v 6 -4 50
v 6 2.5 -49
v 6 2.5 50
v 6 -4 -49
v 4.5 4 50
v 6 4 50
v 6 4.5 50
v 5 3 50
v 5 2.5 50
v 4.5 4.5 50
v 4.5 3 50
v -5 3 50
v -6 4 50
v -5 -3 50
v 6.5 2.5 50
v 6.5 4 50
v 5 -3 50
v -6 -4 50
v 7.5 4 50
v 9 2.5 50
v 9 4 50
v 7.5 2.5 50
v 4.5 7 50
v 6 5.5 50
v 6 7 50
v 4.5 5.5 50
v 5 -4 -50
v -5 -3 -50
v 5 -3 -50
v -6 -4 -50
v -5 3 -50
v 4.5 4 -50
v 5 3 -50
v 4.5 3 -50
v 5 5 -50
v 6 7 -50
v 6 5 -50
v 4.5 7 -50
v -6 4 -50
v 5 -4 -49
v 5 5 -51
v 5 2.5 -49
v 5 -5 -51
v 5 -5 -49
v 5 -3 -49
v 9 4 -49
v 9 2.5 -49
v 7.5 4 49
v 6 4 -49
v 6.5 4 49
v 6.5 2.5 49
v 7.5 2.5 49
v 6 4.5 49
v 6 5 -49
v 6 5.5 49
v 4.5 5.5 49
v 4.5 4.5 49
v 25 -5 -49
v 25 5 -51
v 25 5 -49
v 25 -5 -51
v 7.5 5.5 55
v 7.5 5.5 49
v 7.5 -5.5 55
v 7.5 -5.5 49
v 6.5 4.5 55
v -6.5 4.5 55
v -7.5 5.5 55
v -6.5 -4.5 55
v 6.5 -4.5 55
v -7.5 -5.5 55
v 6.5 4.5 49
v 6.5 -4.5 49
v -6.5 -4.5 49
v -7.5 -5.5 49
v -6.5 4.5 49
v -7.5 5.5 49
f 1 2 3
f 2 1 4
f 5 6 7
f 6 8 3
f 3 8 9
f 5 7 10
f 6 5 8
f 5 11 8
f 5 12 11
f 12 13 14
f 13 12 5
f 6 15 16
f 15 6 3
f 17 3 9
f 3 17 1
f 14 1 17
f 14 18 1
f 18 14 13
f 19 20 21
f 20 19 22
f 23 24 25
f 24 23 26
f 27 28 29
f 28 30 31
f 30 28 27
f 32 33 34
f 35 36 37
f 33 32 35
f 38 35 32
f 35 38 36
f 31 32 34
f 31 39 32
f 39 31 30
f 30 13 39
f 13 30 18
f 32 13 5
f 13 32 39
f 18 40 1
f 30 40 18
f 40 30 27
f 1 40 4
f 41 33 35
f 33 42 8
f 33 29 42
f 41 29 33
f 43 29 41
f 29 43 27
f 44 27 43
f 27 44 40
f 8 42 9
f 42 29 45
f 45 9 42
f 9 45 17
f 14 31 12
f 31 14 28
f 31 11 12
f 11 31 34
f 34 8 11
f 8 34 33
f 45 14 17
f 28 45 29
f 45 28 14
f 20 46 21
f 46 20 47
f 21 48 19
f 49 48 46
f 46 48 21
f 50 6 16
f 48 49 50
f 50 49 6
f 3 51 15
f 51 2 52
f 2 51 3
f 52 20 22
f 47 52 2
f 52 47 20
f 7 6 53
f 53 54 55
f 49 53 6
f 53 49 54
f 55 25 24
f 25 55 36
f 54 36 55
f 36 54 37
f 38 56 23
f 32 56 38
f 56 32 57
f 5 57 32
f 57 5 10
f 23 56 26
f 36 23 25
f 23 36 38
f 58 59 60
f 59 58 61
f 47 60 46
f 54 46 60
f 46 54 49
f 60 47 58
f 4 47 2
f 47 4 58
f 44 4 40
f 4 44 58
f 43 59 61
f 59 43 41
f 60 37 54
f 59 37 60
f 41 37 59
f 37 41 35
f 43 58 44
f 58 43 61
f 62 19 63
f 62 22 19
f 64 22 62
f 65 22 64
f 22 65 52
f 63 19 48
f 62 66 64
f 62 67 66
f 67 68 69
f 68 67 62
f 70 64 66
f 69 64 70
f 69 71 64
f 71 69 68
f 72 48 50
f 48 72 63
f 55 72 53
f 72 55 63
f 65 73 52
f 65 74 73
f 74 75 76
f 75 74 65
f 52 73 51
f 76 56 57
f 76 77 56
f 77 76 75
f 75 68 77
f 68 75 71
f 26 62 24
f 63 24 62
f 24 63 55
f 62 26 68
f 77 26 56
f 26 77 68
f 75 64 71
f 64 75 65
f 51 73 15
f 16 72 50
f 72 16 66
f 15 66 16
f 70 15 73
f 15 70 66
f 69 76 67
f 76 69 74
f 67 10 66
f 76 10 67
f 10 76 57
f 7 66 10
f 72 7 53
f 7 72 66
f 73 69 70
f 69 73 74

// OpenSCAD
// Parameters
outer_width_mm = 12; //[6:24:0.5]
outer_height_mm = 8; //[4:16:0.5]
wall_thickness_mm = 1; //[0.5:2:0.1]
length_mm = 100; //[20:400:1]
overlap_mm = 1; //[0.5:2:0.1]
bezel_thickness_mm = 1.5; //[0.8:3:0.1]
bezel_depth_mm = 6; //[2:20:0.5]
corner_profile_leg_mm = 4; //[2:10:0.5]
corner_profile_thickness_mm = 1.5; //[0.8:4:0.1]
shelf_bracket_width_mm = 10; //[5:25:0.5]
shelf_bracket_thickness_mm = 2; //[1:6:0.5]
shelf_bracket_length_mm = 20; //[8:60:1]

// Box Section
module box_section() {
  color("Silver")
  difference() {
    cube([outer_width_mm, outer_height_mm, length_mm], center=true);
    cube([
      outer_width_mm - 2*wall_thickness_mm,
      outer_height_mm - 2*wall_thickness_mm,
      length_mm + 2*overlap_mm
    ], center=true);
  }
}

// Box Bezel Section (overlaps box end by overlap_mm)
module box_bezel_section() {
  bezel_center_z = length_mm/2 - overlap_mm + bezel_depth_mm/2;

  color("DimGray")
  difference() {
    translate([0, 0, bezel_center_z])
      cube([outer_width_mm + 2*bezel_thickness_mm,
            outer_height_mm + 2*bezel_thickness_mm,
            bezel_depth_mm], center=true);

    translate([0, 0, bezel_center_z])
      cube([outer_width_mm + 2*(bezel_thickness_mm - wall_thickness_mm),
            outer_height_mm + 2*(bezel_thickness_mm - wall_thickness_mm),
            bezel_depth_mm + 2*overlap_mm], center=true);
  }
}

// Box Corner Profile Section (intersects box by overlap_mm in X and Y)
module box_corner_profile_section() {
  color("Black")
  union() {
    // Horizontal leg along +X, near +Y edge
    translate([outer_width_mm/2 + corner_profile_leg_mm/2 - overlap_mm,
               outer_height_mm/2 - corner_profile_thickness_mm/2,
               0])
      cube([corner_profile_leg_mm, corner_profile_thickness_mm, length_mm], center=true);

    // Vertical leg along +Y, near +X edge
    translate([outer_width_mm/2 - corner_profile_thickness_mm/2,
               outer_height_mm/2 + corner_profile_leg_mm/2 - overlap_mm,
               0])
      cube([corner_profile_thickness_mm, corner_profile_leg_mm, length_mm], center=true);
  }
}

// Box Corner Profile Sections
module box_corner_profile_sections() {
  union() {
    box_section();
    box_corner_profile_section();
  }
}

// Box Shelf Bracket Section
module box_shelf_bracket_section() {
  // Attach bracket to the +X side and to the -Z end with overlap in BOTH axes.
  // X: bracket min_x = outer_width/2 - overlap_mm
  bracket_center_x = outer_width_mm/2 - overlap_mm + shelf_bracket_length_mm/2;

  // Z: bracket max_z = -length/2 + overlap_mm
  // => center_z + thickness/2 = -length/2 + overlap_mm
  bracket_center_z = -length_mm/2 + overlap_mm - shelf_bracket_thickness_mm/2;

  // --- FIX: add a small "tab" that was previously floating/offset ---
  // Place it at the -Z end and on the +X side, and make it overlap the box by overlap_mm.
  // This guarantees it is physically connected (no gap) and merges in union().
  tab_len_x = 3;                         // small protruding length
  tab_w_y   = corner_profile_thickness_mm; // keep it small like the corner profile thickness
  tab_h_z   = 2;                         // small height at the end
  tab_center_x = outer_width_mm/2 - overlap_mm + tab_len_x/2; // overlaps box in X by overlap_mm
  tab_center_y = 0;
  tab_center_z = -length_mm/2 + tab_h_z/2 - overlap_mm;       // overlaps box end in Z by overlap_mm

  color("Silver")
  union() {
    box_corner_profile_sections();

    // Shelf bracket (main protruding feature)
    translate([bracket_center_x, 0, bracket_center_z])
      cube([shelf_bracket_length_mm, shelf_bracket_width_mm, shelf_bracket_thickness_mm], center=true);

    // Small tab/feature (now attached with deliberate overlap)
    translate([tab_center_x, tab_center_y, tab_center_z])
      cube([tab_len_x, tab_w_y, tab_h_z], center=true);
  }
}

// Assembly (single connected solid via union; all parts overlap)
module assembly() {
  union() {
    box_shelf_bracket_section();
    box_bezel_section();
  }
}

assembly();
